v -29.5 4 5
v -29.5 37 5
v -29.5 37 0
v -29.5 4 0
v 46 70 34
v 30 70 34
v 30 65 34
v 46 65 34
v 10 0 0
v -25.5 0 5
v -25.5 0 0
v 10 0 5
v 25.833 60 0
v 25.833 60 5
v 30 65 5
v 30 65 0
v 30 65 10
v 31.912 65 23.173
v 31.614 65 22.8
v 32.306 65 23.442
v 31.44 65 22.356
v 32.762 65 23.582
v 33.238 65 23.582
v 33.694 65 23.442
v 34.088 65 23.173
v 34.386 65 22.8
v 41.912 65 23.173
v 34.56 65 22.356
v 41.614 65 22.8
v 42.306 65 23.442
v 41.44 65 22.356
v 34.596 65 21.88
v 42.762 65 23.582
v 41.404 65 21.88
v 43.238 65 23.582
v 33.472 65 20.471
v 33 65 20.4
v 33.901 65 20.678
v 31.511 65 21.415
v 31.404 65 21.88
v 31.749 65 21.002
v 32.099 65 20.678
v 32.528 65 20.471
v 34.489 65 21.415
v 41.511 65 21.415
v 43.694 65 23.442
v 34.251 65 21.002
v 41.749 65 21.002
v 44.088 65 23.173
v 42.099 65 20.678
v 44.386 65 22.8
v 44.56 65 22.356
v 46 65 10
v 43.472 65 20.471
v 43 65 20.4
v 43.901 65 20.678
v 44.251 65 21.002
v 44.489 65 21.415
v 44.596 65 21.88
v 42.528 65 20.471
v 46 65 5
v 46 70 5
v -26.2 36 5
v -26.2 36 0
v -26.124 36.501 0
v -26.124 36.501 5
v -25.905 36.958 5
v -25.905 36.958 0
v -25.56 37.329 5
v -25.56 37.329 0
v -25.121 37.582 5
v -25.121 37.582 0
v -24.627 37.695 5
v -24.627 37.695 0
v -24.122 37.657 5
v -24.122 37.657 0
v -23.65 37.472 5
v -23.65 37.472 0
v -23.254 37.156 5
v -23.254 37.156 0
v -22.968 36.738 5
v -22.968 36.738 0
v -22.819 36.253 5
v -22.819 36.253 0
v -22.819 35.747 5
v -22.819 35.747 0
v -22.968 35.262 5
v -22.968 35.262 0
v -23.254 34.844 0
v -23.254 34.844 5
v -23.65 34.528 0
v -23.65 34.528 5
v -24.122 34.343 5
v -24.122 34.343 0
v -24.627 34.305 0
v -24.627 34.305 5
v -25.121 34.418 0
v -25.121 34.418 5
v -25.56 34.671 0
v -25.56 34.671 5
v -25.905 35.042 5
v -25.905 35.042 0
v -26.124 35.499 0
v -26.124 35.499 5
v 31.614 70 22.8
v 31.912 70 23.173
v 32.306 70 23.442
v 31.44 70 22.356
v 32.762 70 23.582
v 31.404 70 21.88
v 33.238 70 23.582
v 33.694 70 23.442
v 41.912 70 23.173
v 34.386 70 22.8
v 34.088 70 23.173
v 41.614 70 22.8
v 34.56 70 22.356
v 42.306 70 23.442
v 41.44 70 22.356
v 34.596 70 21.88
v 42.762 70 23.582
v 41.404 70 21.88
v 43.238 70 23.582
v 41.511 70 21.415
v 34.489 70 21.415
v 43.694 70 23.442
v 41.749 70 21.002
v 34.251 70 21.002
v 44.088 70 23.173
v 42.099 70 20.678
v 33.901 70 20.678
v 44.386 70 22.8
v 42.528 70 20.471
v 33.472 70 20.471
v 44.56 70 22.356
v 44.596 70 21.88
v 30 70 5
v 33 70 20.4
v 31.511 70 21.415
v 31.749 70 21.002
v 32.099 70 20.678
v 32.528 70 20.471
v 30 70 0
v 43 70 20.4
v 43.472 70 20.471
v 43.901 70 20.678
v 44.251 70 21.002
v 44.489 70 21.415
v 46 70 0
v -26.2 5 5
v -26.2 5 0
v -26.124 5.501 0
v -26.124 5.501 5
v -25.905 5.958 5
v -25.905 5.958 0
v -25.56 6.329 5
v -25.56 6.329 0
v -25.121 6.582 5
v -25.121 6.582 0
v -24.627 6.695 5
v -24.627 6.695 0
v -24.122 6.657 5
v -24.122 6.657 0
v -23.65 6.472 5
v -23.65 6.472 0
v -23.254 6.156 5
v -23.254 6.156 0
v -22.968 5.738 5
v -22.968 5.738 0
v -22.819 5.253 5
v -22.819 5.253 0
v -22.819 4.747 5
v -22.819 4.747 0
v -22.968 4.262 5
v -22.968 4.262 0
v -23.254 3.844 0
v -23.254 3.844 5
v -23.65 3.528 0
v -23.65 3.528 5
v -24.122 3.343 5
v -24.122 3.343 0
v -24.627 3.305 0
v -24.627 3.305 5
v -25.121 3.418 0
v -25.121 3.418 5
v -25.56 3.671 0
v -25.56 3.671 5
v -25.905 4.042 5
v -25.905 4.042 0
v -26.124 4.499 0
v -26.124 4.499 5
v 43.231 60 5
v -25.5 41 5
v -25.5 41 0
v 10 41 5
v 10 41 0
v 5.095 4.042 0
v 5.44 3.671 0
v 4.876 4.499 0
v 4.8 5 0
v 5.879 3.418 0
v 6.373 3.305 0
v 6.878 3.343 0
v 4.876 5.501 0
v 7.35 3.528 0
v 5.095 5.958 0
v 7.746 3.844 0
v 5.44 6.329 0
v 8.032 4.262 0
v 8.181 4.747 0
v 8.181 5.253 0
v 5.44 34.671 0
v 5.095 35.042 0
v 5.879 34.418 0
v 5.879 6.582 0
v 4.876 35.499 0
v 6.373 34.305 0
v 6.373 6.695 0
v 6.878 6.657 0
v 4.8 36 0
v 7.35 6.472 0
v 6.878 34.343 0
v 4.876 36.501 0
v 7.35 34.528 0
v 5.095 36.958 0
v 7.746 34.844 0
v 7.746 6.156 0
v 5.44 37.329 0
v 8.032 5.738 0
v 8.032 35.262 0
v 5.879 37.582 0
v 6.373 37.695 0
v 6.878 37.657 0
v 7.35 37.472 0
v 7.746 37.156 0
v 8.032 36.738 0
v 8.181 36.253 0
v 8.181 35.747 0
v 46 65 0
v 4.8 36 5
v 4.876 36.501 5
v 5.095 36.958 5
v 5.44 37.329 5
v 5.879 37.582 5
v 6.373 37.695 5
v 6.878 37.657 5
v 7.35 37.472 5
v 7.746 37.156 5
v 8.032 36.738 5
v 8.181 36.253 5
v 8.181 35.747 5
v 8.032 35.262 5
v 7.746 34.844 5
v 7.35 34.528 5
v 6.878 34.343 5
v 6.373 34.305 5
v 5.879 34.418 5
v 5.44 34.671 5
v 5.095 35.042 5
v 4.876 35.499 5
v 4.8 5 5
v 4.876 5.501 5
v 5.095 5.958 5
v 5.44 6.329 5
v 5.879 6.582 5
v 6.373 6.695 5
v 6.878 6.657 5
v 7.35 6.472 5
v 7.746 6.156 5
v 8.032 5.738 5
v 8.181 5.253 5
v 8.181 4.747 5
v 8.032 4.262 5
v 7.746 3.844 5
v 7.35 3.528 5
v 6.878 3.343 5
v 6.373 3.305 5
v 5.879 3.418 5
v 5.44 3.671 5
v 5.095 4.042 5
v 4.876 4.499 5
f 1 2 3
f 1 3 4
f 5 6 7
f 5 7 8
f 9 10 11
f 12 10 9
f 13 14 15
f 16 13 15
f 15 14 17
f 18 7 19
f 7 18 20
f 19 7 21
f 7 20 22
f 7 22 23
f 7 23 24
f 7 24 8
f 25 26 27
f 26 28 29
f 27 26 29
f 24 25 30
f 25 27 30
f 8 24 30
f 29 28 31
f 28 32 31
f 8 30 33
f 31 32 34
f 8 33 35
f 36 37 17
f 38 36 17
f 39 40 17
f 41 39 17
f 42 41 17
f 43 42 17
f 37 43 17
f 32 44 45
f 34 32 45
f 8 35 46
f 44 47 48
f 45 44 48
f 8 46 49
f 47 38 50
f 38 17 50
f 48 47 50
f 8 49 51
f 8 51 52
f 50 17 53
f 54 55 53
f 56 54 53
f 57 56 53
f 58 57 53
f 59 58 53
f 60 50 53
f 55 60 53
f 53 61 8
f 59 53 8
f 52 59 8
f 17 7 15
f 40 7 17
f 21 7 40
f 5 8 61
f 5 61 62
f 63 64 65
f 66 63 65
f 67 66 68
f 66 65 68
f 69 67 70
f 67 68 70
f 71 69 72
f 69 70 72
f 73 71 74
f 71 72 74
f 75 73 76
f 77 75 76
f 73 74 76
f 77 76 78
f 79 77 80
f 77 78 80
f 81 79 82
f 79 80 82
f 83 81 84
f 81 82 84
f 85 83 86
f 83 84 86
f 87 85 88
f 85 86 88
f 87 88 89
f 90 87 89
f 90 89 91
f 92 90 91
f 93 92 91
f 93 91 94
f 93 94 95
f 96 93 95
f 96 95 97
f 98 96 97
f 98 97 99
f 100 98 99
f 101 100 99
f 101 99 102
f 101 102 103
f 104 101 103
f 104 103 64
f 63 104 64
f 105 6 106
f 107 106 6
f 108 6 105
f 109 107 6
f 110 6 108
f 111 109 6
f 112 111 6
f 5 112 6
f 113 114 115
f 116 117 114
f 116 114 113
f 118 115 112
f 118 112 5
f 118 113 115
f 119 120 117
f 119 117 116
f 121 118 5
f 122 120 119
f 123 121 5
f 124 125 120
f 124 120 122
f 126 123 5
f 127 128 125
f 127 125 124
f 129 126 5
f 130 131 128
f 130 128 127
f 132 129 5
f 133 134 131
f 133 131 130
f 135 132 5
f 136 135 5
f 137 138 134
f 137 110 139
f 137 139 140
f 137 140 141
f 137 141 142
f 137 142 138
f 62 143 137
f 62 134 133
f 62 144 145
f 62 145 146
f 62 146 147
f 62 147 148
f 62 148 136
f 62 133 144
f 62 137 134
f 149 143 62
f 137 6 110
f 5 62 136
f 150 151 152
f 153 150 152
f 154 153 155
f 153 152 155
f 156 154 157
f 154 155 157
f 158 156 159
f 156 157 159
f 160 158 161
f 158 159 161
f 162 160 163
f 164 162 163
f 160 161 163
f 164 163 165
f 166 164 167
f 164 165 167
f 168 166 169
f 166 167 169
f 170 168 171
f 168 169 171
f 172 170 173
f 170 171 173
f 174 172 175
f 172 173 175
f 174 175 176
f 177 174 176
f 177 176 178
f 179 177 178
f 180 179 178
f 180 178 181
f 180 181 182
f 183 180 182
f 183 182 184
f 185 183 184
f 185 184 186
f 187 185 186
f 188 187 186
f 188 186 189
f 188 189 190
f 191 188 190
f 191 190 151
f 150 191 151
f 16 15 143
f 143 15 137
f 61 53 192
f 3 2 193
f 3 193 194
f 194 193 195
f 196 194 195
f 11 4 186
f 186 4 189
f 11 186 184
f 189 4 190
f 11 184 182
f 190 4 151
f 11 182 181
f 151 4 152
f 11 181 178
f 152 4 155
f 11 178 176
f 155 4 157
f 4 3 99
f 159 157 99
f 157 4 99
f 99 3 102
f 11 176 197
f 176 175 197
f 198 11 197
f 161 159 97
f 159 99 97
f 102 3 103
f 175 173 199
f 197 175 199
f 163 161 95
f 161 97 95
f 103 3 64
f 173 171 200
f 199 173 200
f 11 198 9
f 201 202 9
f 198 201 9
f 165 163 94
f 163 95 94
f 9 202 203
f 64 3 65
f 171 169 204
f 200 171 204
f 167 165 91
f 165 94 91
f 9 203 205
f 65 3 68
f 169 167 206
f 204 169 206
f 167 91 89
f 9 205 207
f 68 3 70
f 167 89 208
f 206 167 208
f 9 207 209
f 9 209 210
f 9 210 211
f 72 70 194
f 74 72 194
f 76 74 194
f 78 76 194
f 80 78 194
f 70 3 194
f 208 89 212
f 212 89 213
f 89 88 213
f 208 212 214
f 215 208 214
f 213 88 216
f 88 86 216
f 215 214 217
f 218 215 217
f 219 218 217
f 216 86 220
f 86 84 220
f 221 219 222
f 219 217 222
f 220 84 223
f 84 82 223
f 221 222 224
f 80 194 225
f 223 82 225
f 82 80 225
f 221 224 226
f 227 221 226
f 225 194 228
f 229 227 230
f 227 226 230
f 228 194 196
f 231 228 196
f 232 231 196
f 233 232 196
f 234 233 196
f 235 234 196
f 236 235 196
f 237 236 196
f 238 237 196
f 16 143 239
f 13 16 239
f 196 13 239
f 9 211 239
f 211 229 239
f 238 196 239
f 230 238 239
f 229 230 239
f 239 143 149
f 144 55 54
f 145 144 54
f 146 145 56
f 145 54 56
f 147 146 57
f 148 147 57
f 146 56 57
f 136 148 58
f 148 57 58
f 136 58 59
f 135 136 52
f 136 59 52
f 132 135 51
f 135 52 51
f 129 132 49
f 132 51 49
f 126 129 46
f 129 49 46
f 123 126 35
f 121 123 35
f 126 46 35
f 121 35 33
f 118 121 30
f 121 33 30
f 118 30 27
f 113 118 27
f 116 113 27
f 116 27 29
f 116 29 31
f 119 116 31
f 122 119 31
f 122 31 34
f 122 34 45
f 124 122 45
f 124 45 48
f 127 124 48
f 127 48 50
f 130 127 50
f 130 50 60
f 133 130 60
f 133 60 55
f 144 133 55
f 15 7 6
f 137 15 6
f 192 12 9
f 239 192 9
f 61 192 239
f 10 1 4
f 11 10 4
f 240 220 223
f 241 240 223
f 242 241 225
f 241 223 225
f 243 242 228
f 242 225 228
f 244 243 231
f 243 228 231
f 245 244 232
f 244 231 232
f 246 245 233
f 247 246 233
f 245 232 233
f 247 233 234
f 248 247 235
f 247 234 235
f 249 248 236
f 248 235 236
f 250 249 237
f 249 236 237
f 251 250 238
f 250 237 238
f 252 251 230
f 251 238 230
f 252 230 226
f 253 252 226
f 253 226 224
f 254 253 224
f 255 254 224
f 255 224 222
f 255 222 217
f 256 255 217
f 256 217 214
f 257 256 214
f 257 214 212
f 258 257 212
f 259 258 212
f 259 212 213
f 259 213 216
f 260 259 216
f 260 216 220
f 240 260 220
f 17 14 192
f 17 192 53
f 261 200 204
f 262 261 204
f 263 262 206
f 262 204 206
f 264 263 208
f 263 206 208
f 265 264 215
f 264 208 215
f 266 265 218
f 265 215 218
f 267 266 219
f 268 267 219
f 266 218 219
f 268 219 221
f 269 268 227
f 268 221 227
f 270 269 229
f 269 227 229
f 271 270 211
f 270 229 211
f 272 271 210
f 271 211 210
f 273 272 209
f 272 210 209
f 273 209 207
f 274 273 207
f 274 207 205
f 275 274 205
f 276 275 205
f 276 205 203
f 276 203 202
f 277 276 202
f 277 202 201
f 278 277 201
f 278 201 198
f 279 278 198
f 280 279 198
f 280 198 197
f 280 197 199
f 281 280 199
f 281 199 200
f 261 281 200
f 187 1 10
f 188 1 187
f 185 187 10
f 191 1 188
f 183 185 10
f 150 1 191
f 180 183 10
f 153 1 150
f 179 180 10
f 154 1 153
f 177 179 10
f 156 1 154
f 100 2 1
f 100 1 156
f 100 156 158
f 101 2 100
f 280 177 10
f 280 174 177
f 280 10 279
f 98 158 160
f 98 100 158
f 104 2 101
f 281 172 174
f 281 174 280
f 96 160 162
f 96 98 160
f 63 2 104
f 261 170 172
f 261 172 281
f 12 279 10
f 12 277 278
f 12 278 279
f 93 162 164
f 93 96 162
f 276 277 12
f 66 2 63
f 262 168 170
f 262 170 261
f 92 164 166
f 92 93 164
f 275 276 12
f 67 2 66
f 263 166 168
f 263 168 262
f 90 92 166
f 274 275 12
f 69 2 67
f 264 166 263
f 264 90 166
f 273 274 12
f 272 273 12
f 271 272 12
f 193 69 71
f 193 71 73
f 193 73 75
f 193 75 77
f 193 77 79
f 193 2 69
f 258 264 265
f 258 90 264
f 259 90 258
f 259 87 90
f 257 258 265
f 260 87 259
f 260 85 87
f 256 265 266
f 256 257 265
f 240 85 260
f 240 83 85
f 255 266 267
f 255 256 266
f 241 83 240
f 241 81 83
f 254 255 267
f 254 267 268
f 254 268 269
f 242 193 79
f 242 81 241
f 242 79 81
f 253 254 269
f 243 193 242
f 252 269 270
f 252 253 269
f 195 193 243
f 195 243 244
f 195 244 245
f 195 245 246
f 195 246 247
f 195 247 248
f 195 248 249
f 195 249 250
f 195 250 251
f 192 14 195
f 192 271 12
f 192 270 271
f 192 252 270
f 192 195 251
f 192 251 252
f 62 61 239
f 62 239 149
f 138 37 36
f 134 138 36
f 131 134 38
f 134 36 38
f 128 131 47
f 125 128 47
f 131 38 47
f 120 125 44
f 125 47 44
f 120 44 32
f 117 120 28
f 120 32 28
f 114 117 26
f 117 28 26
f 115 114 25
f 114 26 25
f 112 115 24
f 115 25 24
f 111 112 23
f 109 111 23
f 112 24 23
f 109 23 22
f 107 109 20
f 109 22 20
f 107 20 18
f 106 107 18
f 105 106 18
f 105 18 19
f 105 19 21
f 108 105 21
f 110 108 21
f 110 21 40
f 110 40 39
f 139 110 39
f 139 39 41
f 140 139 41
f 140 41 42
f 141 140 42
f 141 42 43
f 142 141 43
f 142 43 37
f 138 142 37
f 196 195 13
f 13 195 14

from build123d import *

# Parameters (mm, degrees)
P_IDAT_VYSUNUT_M1_DEPTH   = 4.999999888
ODEBRAT_VYSUNUT_M1_DEPTH  = 84.910666461
SKICA3_W                  = 16.00000076
SKICA3_H                  = 5.000002682
P_IDAT_VYSUNUT_M2_DEPTH   = 20
ODEBRAT_VYSUNUT_M3_DEPTH  = 87.116200856
ODEBRAT_VYSUNUT_M4_DEPTH  = 87.116200856
ODEBRAT_VYSUNUT_M5_DEPTH  = 87.116200856
ODEBRAT_VYSUNUT_M6_DEPTH  = 87.116200856
ZKOSEN_1_SIZE             = 4.000000656
ZKOSEN_2_SIZE             = 4.999998957
ZKOSEN_2_SIZE_2           = 4.999999888
ZKOSEN_3_SIZE             = 3.999999976
ZKOSEN_3_SIZE2            = 4.000000587
SKICA11_R                 = 1.7
ODEBRAT_VYSUNUT_M9_DEPTH  = 10
SKICA12_W                 = 16.00000076
SKICA12_H                 = 5.000002682
P_IDAT_VYSUNUT_M3_DEPTH   = 9
SKICA10_R                 = 1.6
SKICA10_R_2               = 1.599999993
ODEBRAT_VYSUNUT_M10_DEPTH = 9


with BuildPart() as part:
    # Skica1 → Přidat vysunutím1 (new body)
    with BuildSketch(Plane.XY.offset(4.999999888)):
        Polygon((45.999998971, 70.000000298), (-29.500000179, 70.000000298), (-29.500000179, 6.8e-07), (9.999999776, 6.8e-07), (45.999998971, 64.999998915), align=None)
    extrude(amount=-P_IDAT_VYSUNUT_M1_DEPTH)

    # Skica2 → Odebrat vysunutím1 (cut, through all)
    with BuildSketch(Plane.XY.offset(4.999999888)):
        Polygon((25.833334774, 59.999998659), (30.000000641, 64.999996523), (30.000000641, 70.000000298), (-29.500000179, 70.000000298), (-29.500000179, 41.000001132), (9.999999776, 41.000001132), align=None)
    extrude(amount=-ODEBRAT_VYSUNUT_M1_DEPTH, mode=Mode.SUBTRACT)

    # Skica3 → Přidat vysunutím2 (add)
    with BuildSketch(Plane.XY.offset(4.999999888)):
        with Locations((37.999999709, 67.499998957)):
            Rectangle(SKICA3_W, SKICA3_H)
    extrude(amount=P_IDAT_VYSUNUT_M2_DEPTH)

    # Skica5 → Odebrat vysunutím3 (cut, through all)
    with BuildSketch(Plane.XY.offset(4.999999888)):
        Polygon((-23.097474128, 4.468092229), (-23.010937497, 4.819194786), (-23.010937497, 5.180804525), (-23.097474128, 5.531907082), (-23.265523836, 5.85209718), (-23.505315185, 6.122766063), (-23.802915588, 6.328184158), (-24.141026661, 6.456412841), (-24.499999359, 6.500000134), (-24.85897392, 6.456412841), (-25.197084993, 6.328184158), (-25.494683534, 6.122766063), (-25.734476745, 5.85209718), (-25.90252459, 5.531907082), (-25.989063084, 5.180804525), (-25.989063084, 4.819194786), (-25.90252459, 4.468092229), (-25.734476745, 4.147903062), (-25.494683534, 3.877233714), (-25.197084993, 3.671815852), (-24.85897392, 3.543587169), (-24.499999359, 3.500000108), (-24.141026661, 3.543587169), (-23.802915588, 3.671815852), (-23.505315185, 3.877233714), (-23.265523836, 4.147903062), align=None)
    extrude(amount=-ODEBRAT_VYSUNUT_M3_DEPTH, mode=Mode.SUBTRACT)

    # Skica6 → Odebrat vysunutím4 (cut, through all)
    with BuildSketch(Plane.XY.offset(4.999999888)):
        Polygon((5.505315959, 3.877233714), (5.802914966, 3.671815852), (6.141026504, 3.543587169), (6.500000134, 3.500000108), (6.858973298, 3.543587169), (7.197084371, 3.671815852), (7.494683843, 3.877233714), (7.734475657, 4.147903062), (7.902524434, 4.468092229), (7.989062928, 4.819194786), (7.989062928, 5.180804525), (7.902524434, 5.531907082), (7.734475657, 5.85209718), (7.494683843, 6.122766063), (7.197084371, 6.328184158), (6.858973298, 6.456412841), (6.500000134, 6.500000134), (6.141026504, 6.456412841), (5.802914966, 6.328184158), (5.505315959, 6.122766063), (5.26552368, 5.85209718), (5.097475369, 5.531907082), (5.010936875, 5.180804525), (5.010936875, 4.819194786), (5.097475369, 4.468092229), (5.26552368, 4.147903062), align=None)
    extrude(amount=-ODEBRAT_VYSUNUT_M4_DEPTH, mode=Mode.SUBTRACT)

    # Skica7 → Odebrat vysunutím5 (cut, through all)
    with BuildSketch(Plane.XY.offset(4.999999888)):
        Polygon((-23.377234116, 35.005312413), (-23.171816021, 35.302914679), (-23.043585941, 35.641025752), (-23.000000045, 35.99999845), (-23.043585941, 36.358974874), (-23.171816021, 36.697082222), (-23.377234116, 36.994680762), (-23.647902533, 37.234473974), (-23.968091235, 37.402521819), (-24.319194257, 37.489064038), (-24.680804461, 37.489064038), (-25.031907484, 37.402521819), (-25.352096185, 37.234473974), (-25.622766465, 36.994680762), (-25.82818456, 36.697082222), (-25.956412777, 36.358974874), (-26.000000536, 35.99999845), (-25.956412777, 35.641025752), (-25.82818456, 35.302914679), (-25.622766465, 35.005312413), (-25.352096185, 34.765522927), (-25.031907484, 34.597471356), (-24.680804461, 34.510936588), (-24.319194257, 34.510936588), (-23.968091235, 34.597471356), (-23.647902533, 34.765522927), align=None)
    extrude(amount=-ODEBRAT_VYSUNUT_M5_DEPTH, mode=Mode.SUBTRACT)

    # Skica8 → Odebrat vysunutím6 (cut, through all)
    with BuildSketch(Plane.XY.offset(4.999999888)):
        Polygon((5.968092475, 34.597471356), (6.319194566, 34.510936588), (6.68080477, 34.510936588), (7.031906862, 34.597471356), (7.35209696, 34.765522927), (7.622765843, 35.005312413), (7.828184403, 35.302914679), (7.956412621, 35.641025752), (8.00000038, 35.99999845), (7.956412621, 36.358974874), (7.828184403, 36.697082222), (7.622765843, 36.994680762), (7.35209696, 37.234473974), (7.031906862, 37.402521819), (6.68080477, 37.489064038), (6.319194566, 37.489064038), (5.968092475, 37.402521819), (5.647902843, 37.234473974), (5.377233494, 36.994680762), (5.171815865, 36.697082222), (5.043587182, 36.358974874), (4.999999888, 35.99999845), (5.043587182, 35.641025752), (5.171815865, 35.302914679), (5.377233494, 35.005312413), (5.647902843, 34.765522927), align=None)
    extrude(amount=-ODEBRAT_VYSUNUT_M6_DEPTH, mode=Mode.SUBTRACT)

    # Zkosení1
    zkosen_1_edges = [part.edges().sort_by_distance(p)[0] for p in [
        (-29.500000179, 41.000001132, 2.499999944),
    ]]
    chamfer(zkosen_1_edges, length=ZKOSEN_1_SIZE)

    # Zkosení2
    # the kernel refuses this chamfer: 4.999999888, 4.999998957 mm, written as the material it adds along each edge
    with BuildSketch(Plane(origin=(58.858412936, 64.999997616, 4.999999888), x_dir=(0, -0.999621916702082, -0.027495884216655726), z_dir=(-1, 0, 0))) as zkosen_2_piece_1_section:
        Polygon((ZKOSEN_2_SIZE * 0.999621916686, ZKOSEN_2_SIZE * 0.0274958842162), (-ZKOSEN_2_SIZE_2 * 0.027495884218, ZKOSEN_2_SIZE_2 * 0.99962191675), (0, 0), align=None)
    zkosen_2_piece_1 = extrude(amount=41.716826979, mode=Mode.PRIVATE)
    zkosen_2_piece_1 = split(zkosen_2_piece_1, bisect_by=Plane(origin=(43.332283636, 60.183290695, 6.69217666), z_dir=(-0.8747913551064548, 0.4844998297533371, 0)), keep=Keep.TOP, mode=Mode.PRIVATE)
    zkosen_2_piece_1 = split(zkosen_2_piece_1, bisect_by=Plane(origin=(32.300745654, 67.760889889, 6.69217666), z_dir=(0.7682212055202173, -0.6401844885570597, 0)), keep=Keep.TOP, mode=Mode.PRIVATE)
    add(zkosen_2_piece_1)

    # Zkosení3
    zkosen_3_edges = [part.edges().sort_by_distance(p)[0] for p in [
        (-29.500000179, 6.8e-07, 2.499999944),
    ]]
    zkosen_3_side = [part.faces().sort_by_distance(p)[0] for p in [
        (-9.750000201, 6.8e-07, 2.499999944),
    ]]
    chamfer(zkosen_3_edges, length=ZKOSEN_3_SIZE, length2=ZKOSEN_3_SIZE2, reference=zkosen_3_side[0])

    # Skica11 → Odebrat vysunutím9 (cut)
    with BuildSketch(Plane(origin=(0, 0, 0), x_dir=(-1, 0, 0), z_dir=(0, 0, -1))):
        with Locations((-6.500000134, 35.99999845)):
            Circle(SKICA11_R)
        with Locations((24.499998894, 35.99999845)):
            Circle(SKICA11_R)
        with Locations((-6.500000134, 4.999999655)):
            Circle(SKICA11_R)
        with Locations((24.499999359, 4.999999655)):
            Circle(SKICA11_R)
    extrude(amount=-ODEBRAT_VYSUNUT_M9_DEPTH, mode=Mode.SUBTRACT)

    # Skica12 → Přidat vysunutím3 (add)
    with BuildSketch(Plane.XY.offset(24.999999888)):
        with Locations((37.999999709, 67.499998957)):
            Rectangle(SKICA12_W, SKICA12_H)
    extrude(amount=P_IDAT_VYSUNUT_M3_DEPTH)

    # Skica10 → Odebrat vysunutím10 (cut)
    with BuildSketch(Plane.XZ.offset(-64.999997616)):
        with Locations(Location((32.999999717, 21.999999776, 0), (0, 0, 270))):
            Circle(SKICA10_R)
        with Locations(Location((42.999999717, 21.999999776, 0), (0, 0, 270))):
            Circle(SKICA10_R_2)
    extrude(amount=-ODEBRAT_VYSUNUT_M10_DEPTH, mode=Mode.SUBTRACT)


solid = part.part
